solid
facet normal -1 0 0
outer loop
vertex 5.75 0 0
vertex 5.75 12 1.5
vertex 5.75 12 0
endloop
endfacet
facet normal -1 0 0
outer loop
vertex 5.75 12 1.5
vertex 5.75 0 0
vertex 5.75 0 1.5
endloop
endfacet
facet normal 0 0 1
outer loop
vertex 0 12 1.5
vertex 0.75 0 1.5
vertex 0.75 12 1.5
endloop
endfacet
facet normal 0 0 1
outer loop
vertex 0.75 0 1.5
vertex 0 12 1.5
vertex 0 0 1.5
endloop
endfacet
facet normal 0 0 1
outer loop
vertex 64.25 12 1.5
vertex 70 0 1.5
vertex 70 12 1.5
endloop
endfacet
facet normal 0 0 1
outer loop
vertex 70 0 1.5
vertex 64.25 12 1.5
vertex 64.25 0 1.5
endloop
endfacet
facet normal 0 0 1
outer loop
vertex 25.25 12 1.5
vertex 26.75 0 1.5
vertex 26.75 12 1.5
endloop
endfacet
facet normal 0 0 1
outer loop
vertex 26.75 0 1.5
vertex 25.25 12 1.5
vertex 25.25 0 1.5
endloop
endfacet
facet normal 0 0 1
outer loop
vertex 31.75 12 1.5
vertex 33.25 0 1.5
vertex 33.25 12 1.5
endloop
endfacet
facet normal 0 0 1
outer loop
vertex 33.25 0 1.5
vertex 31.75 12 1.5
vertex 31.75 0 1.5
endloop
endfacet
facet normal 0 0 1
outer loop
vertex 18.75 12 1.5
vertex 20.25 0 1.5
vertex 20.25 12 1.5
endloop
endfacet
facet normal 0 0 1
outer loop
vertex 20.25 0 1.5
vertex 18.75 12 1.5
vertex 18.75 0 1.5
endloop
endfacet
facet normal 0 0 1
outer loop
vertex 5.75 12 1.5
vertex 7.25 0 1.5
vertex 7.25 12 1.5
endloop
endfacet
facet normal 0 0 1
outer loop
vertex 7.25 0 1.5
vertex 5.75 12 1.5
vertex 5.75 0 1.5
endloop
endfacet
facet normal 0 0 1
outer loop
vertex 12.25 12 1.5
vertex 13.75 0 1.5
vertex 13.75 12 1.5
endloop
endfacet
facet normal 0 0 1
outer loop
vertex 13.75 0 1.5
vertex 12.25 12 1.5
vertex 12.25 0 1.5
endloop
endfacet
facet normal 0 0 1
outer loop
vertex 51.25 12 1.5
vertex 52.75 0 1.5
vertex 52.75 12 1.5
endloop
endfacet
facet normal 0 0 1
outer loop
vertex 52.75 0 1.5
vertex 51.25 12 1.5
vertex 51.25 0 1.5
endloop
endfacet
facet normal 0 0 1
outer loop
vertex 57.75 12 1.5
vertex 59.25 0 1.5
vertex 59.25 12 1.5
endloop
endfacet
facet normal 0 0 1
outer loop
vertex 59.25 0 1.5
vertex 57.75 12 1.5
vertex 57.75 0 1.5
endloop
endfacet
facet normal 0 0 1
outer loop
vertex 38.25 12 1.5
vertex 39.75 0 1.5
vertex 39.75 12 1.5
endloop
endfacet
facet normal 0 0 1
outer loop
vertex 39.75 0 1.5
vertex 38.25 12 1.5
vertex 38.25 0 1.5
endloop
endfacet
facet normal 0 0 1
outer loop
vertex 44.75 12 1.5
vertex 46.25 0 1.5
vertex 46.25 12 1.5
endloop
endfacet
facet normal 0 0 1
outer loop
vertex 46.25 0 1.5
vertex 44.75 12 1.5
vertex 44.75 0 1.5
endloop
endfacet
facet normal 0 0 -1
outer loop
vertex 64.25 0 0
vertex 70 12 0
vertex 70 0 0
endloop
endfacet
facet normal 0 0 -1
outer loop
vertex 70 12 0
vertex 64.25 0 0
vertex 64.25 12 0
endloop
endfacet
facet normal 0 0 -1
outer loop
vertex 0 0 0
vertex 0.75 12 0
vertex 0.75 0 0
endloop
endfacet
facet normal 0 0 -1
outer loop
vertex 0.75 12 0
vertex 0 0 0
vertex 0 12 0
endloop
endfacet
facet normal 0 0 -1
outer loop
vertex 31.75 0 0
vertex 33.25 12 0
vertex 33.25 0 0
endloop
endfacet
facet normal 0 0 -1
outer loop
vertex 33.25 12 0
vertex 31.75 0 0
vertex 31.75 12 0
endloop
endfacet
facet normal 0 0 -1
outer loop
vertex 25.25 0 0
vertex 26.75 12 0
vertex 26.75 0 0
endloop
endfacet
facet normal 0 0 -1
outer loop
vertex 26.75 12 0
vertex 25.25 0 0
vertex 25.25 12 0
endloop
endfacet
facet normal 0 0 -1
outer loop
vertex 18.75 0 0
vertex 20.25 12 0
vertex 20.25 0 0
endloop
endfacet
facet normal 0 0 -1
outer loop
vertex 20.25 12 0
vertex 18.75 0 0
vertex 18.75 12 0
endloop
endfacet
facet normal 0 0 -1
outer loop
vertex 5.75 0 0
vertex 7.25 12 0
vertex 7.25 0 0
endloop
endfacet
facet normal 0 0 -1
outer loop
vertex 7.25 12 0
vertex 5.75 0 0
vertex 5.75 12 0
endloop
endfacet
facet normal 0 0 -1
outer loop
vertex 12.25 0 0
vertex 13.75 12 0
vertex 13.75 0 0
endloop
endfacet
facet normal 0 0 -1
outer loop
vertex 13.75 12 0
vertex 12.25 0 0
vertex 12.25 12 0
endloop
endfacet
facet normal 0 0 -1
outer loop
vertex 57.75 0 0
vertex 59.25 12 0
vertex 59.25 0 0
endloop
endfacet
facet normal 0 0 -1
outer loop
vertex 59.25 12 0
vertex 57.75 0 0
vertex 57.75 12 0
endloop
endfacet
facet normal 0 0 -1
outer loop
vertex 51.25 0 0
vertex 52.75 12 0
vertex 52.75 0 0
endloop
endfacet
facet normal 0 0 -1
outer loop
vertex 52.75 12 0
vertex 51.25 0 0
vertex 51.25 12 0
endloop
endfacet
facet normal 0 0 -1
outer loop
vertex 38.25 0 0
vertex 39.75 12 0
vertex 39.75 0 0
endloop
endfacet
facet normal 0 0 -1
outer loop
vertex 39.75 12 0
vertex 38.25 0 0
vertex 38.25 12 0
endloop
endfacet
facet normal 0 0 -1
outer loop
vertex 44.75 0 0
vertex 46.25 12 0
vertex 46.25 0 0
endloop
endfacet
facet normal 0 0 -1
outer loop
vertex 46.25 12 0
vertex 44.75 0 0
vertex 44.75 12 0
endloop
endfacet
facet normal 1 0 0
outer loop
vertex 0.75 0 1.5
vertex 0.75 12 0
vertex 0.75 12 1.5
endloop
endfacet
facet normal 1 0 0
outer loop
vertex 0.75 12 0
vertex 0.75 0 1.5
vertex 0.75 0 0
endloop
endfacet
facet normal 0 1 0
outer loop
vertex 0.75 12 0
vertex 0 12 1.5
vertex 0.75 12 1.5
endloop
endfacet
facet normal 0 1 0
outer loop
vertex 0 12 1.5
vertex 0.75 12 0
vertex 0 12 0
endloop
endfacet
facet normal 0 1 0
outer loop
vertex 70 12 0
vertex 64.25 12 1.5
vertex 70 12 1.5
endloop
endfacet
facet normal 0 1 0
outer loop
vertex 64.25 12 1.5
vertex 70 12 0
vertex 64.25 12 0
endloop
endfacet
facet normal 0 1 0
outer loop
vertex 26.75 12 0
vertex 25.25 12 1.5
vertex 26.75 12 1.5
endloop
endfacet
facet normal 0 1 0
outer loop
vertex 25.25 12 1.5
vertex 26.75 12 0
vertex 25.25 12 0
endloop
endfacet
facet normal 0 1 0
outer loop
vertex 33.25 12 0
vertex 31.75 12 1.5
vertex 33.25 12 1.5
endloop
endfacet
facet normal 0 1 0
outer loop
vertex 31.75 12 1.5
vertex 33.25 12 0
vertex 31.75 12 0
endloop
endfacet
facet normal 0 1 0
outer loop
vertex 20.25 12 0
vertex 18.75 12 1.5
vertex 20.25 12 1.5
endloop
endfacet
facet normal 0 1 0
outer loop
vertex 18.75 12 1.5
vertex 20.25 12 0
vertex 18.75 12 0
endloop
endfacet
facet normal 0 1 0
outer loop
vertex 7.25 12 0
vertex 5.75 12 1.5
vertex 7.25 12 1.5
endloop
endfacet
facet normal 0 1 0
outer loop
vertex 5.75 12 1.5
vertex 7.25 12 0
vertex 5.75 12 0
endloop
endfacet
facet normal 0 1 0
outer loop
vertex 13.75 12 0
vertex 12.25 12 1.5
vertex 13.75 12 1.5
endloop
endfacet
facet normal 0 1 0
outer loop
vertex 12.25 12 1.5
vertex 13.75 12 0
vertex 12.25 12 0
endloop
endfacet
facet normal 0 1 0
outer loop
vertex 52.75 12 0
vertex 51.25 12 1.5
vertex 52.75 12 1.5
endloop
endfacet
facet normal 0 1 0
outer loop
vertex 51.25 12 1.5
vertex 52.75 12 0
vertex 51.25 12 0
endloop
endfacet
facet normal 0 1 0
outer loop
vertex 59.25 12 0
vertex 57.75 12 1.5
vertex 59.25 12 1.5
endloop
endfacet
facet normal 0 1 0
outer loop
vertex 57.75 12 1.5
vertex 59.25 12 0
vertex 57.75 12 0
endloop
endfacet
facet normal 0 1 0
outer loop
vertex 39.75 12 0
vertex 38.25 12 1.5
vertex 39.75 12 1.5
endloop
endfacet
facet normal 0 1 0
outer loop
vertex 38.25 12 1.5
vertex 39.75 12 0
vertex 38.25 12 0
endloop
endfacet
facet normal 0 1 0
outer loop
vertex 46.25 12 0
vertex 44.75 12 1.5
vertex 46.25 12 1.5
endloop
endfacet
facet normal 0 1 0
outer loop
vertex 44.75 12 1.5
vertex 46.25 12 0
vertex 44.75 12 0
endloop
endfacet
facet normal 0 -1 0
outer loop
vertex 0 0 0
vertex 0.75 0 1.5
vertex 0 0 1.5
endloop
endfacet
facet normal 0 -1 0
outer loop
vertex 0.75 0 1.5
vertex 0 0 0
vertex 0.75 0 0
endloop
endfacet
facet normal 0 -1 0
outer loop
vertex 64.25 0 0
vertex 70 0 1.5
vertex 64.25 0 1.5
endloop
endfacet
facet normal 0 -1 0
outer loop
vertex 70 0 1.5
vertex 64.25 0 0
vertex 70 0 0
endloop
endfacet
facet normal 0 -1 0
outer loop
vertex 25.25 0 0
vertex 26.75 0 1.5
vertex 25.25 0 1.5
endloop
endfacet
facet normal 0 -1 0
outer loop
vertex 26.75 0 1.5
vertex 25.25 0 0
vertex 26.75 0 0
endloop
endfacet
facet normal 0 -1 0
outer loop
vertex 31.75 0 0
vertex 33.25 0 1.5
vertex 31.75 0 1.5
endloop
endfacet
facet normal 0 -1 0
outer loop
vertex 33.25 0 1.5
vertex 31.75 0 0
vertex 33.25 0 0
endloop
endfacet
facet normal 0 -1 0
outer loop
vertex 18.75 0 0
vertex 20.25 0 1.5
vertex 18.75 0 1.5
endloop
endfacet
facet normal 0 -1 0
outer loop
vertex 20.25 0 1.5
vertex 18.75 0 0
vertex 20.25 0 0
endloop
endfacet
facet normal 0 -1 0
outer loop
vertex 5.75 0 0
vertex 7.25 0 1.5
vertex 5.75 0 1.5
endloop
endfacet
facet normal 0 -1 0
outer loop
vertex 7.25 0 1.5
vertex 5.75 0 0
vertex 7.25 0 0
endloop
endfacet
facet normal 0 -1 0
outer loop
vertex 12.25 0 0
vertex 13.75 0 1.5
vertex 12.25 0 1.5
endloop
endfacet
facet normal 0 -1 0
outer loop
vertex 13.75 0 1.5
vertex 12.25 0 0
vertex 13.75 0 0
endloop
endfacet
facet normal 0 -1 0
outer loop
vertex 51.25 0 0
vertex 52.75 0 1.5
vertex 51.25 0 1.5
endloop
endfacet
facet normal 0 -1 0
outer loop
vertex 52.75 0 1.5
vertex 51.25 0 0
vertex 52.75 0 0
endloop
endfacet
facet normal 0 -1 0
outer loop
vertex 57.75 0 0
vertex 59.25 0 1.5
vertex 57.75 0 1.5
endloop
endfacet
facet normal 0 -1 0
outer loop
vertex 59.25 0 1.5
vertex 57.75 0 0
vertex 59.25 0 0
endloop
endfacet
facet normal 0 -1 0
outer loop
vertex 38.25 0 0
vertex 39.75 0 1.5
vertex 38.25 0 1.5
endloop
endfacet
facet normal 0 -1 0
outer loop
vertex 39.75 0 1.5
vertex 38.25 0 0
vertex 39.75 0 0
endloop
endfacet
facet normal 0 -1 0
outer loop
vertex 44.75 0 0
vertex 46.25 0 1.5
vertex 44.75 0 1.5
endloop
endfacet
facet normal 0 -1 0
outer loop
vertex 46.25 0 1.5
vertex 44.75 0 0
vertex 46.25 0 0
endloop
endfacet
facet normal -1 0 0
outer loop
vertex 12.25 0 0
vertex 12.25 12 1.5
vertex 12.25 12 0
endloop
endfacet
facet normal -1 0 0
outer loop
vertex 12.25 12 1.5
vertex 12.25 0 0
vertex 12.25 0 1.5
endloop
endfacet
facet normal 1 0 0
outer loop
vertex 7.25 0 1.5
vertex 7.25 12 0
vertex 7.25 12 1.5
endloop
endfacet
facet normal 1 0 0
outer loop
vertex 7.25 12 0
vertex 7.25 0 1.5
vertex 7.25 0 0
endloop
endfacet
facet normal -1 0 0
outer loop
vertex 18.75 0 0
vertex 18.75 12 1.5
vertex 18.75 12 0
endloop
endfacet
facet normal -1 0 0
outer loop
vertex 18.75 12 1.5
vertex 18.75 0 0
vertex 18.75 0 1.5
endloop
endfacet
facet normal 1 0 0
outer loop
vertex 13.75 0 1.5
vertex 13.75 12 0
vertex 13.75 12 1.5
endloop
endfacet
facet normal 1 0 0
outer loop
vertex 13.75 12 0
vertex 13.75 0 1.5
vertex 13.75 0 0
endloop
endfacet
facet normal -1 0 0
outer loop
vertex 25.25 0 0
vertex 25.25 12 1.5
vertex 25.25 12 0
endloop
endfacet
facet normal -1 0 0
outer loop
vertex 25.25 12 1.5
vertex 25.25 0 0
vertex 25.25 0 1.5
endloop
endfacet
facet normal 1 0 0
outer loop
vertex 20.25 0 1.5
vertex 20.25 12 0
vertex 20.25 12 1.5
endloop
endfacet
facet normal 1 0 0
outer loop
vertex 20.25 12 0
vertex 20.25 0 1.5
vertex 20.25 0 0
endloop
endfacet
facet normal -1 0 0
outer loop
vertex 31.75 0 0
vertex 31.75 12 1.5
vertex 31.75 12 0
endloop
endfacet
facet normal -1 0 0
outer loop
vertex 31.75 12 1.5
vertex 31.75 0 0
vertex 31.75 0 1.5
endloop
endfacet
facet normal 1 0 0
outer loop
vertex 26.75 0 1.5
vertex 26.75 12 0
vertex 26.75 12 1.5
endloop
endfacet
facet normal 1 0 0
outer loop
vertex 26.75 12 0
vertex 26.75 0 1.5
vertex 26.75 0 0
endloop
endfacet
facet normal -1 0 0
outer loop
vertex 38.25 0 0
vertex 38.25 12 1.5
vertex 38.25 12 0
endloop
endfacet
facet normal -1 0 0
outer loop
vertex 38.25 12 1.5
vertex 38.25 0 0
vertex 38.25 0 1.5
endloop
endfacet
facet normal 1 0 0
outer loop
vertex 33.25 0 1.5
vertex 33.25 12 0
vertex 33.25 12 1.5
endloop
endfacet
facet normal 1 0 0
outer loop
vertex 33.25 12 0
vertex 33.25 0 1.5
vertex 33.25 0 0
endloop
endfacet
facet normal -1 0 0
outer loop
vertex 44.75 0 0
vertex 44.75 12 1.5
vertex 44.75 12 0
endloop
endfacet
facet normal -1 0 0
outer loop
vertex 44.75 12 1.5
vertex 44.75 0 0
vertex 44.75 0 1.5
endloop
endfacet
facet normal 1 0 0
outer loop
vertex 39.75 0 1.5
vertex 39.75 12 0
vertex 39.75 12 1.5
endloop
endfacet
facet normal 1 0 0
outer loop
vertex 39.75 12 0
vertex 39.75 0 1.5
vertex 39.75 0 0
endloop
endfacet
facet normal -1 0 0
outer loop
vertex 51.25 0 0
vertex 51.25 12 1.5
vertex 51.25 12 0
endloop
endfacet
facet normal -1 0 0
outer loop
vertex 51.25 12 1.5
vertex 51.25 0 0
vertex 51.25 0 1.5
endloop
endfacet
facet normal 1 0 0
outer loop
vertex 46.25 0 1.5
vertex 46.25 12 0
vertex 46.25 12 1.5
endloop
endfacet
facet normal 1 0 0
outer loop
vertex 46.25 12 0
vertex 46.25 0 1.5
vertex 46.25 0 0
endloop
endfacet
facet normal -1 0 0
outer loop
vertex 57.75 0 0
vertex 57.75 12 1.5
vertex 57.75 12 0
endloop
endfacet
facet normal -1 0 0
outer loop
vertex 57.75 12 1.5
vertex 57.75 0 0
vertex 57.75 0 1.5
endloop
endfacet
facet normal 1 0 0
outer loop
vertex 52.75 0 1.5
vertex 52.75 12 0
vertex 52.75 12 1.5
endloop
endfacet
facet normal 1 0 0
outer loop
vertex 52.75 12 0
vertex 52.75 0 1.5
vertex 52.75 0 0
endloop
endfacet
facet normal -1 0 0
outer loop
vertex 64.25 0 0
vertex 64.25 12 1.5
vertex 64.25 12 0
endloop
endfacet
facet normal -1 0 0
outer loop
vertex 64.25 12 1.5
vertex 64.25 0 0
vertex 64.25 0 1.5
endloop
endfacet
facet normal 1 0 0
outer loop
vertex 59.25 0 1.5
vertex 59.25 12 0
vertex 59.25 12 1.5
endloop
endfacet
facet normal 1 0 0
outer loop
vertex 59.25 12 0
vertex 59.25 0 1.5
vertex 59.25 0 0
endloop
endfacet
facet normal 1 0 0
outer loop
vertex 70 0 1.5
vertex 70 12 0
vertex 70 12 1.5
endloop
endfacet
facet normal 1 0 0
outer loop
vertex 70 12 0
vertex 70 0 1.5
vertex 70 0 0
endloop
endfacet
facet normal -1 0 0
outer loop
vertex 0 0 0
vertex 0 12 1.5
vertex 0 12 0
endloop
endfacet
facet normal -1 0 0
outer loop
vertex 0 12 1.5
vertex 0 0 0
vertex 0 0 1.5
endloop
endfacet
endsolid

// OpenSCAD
// Dimensions for the 10-well comb design

// Overall dimensions
spine_length = 70;    // Length of the spine (X dimension) in mm
spine_width = 12;      // Width of the spine (Y dimension) in mm
plate_thickness = 1.5; // Thickness of the plate (Z dimension)

// Tooth dimensions
num_teeth = 10;        // Number of teeth
tooth_width = 5.0;     // Width of each tooth (X dimension)
tooth_length = 12;     // Length of each tooth (Y dimension - depth/hang length in the -Y direction)
gap_width = 1.5;       // Gap between neighboring teeth (Y dimension)

// Positioning calculations
// Total width occupied by teeth and gaps along the Y-axis
total_tooth_and_gap_width = (num_teeth * tooth_width) + ((num_teeth - 1) * gap_width);

// Center the tooth arrangement along the spine_length (X-axis)
x_center = spine_length / 2;
tooth_start_x = x_center - (total_tooth_and_gap_width / 2);


// --- Main Body Construction ---

difference() {
    // 1. Base block for the entire comb structure (Spine)
    color("gray")
    cube([spine_length, spine_width, plate_thickness]);

    // 2. Cut out the spaces where teeth should be (the slots/gaps).
    // We define the cutouts as rectangular prisms that span the thickness of the plate (Z=1.5) and extend into the -Y direction.
    for (i = [0 : num_teeth - 1]) {
        // Calculate the center X position for the i-th tooth slot
        tooth_center_x = tooth_start_x + (i * (tooth_width + gap_width));

        // Define the rectangular cutout shape.
        // The cut runs along X (width=tooth_width), extends in Y by tooth_length, and has thickness plate_thickness.
        translate([tooth_center_x - tooth_width/2, 0, 0]) {
            cube([tooth_width, tooth_length, plate_thickness]);
        }
    }
}
